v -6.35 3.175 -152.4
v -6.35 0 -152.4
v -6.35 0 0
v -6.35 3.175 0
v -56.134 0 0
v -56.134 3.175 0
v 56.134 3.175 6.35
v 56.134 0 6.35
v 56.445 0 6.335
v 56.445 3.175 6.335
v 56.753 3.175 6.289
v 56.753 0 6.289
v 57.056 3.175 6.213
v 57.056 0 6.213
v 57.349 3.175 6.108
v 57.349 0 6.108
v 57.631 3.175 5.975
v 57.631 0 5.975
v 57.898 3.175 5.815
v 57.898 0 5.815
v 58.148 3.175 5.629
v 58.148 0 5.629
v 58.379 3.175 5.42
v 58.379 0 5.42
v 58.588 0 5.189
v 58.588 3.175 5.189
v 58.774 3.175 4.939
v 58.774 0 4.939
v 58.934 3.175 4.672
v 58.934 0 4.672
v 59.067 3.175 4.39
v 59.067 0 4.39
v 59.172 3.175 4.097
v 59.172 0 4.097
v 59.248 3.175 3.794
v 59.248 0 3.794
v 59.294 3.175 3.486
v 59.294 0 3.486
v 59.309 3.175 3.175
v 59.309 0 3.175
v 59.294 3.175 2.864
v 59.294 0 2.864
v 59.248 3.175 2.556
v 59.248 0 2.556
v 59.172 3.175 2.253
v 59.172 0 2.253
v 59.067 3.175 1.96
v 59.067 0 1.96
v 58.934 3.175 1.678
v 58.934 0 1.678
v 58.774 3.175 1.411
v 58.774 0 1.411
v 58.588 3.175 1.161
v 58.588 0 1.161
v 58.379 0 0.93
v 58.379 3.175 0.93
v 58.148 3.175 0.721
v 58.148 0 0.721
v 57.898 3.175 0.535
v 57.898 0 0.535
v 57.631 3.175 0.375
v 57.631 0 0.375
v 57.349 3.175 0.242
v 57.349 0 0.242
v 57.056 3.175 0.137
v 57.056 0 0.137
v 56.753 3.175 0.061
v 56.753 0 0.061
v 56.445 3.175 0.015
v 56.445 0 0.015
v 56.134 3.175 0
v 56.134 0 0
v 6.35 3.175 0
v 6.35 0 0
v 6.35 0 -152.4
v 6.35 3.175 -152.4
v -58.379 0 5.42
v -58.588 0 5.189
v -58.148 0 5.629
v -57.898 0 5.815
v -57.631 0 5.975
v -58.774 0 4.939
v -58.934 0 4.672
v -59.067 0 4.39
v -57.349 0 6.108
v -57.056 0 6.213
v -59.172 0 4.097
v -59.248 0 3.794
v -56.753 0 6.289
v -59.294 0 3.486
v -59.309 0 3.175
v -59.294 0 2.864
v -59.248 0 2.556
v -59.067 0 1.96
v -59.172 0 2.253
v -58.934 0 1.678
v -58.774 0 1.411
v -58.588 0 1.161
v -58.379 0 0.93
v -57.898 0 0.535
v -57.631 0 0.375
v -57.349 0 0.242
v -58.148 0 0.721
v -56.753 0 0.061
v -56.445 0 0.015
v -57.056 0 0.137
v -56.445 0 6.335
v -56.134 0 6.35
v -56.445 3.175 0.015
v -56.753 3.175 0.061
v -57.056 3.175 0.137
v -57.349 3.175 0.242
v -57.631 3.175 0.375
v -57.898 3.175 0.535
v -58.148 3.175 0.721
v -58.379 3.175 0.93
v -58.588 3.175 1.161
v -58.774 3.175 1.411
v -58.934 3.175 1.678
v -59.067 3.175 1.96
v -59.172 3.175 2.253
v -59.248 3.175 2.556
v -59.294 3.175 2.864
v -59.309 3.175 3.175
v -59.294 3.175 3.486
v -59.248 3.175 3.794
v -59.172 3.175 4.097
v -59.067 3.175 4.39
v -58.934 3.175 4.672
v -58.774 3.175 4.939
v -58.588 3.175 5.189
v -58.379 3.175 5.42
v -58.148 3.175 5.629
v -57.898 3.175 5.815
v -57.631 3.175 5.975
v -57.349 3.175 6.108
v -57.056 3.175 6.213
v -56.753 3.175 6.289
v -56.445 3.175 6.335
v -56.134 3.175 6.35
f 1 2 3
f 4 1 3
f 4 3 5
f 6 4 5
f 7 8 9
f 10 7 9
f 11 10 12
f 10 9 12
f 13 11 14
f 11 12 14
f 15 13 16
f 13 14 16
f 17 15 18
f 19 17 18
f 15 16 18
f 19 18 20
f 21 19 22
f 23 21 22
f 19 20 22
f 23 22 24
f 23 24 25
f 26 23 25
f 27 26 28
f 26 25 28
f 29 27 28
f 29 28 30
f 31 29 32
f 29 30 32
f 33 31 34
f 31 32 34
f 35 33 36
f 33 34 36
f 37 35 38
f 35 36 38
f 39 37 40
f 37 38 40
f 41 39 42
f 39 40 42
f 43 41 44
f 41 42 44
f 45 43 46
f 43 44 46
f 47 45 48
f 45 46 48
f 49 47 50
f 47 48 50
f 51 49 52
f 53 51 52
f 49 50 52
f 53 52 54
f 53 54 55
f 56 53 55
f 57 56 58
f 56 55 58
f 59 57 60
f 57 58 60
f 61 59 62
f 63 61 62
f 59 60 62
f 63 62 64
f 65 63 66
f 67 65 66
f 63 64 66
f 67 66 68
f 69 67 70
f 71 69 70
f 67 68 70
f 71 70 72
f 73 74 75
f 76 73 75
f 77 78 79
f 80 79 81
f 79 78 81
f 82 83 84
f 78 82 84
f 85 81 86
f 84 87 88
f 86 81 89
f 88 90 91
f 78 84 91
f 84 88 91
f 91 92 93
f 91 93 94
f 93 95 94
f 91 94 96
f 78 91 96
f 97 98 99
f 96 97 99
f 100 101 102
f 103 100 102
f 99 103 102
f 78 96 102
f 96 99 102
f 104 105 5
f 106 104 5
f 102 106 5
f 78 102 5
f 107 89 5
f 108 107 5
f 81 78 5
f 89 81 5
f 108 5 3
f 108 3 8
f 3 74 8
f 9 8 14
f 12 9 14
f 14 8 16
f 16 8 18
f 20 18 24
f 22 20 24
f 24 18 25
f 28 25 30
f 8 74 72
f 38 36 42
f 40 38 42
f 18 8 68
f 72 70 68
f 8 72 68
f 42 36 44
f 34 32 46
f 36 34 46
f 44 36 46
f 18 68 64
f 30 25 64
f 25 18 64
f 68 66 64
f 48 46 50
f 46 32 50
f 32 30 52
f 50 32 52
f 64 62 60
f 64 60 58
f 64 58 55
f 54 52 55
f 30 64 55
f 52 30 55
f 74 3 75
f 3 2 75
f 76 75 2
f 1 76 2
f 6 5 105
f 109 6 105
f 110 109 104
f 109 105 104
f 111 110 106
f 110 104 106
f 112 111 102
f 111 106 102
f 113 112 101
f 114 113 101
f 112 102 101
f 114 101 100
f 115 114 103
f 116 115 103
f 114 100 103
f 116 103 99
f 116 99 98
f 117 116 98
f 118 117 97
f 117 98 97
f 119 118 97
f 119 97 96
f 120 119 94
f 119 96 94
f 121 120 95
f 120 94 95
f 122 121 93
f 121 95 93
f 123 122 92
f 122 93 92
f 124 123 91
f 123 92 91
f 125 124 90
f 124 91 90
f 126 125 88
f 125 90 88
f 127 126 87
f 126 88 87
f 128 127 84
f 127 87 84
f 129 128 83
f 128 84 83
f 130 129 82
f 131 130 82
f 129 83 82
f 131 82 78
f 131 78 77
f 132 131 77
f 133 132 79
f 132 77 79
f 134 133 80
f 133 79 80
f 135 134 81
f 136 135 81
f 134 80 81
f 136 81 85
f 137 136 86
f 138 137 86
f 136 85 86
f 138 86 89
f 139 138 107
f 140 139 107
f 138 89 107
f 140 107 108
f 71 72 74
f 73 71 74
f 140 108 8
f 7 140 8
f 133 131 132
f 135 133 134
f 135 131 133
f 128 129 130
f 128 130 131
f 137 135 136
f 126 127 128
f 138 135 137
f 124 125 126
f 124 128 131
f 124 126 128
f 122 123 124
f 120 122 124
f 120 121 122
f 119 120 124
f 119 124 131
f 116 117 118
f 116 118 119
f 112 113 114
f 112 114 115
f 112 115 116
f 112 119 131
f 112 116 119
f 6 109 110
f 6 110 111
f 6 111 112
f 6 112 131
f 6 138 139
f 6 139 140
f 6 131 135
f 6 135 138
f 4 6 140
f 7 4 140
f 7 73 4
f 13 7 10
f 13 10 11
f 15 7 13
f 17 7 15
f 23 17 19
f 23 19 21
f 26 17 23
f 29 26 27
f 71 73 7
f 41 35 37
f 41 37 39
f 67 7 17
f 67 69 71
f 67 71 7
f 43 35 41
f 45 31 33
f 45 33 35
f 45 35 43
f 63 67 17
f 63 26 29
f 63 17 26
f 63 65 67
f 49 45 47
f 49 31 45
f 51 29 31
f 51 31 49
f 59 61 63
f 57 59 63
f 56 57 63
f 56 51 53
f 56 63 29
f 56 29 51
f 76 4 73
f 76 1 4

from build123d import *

# Parameters (mm, degrees)
BOSS_EXTRUDE1_DEPTH = 3.175


with BuildPart() as part:
    # Sketch1 → Boss-Extrude1 (new body)
    with BuildSketch(Plane(origin=(0, 0, 0), x_dir=(1, 0, 0), z_dir=(0, 1, 0))):
        with BuildLine():
            Line((-6.35, 0), (-56.134, 0))
            ThreePointArc((-56.134, 0), (-59.309, -3.175), (-56.134, -6.35))
            Line((-56.134, -6.35), (56.134, -6.35))
            ThreePointArc((56.134, -6.35), (59.309, -3.175), (56.134, 0))
            Line((56.134, 0), (6.35, 0))
            Line((6.35, 0), (6.35, 152.4))
            Line((6.35, 152.4), (-6.35, 152.4))
            Line((-6.35, 152.4), (-6.35, 0))
        make_face()
    extrude(amount=BOSS_EXTRUDE1_DEPTH)


solid = part.part
